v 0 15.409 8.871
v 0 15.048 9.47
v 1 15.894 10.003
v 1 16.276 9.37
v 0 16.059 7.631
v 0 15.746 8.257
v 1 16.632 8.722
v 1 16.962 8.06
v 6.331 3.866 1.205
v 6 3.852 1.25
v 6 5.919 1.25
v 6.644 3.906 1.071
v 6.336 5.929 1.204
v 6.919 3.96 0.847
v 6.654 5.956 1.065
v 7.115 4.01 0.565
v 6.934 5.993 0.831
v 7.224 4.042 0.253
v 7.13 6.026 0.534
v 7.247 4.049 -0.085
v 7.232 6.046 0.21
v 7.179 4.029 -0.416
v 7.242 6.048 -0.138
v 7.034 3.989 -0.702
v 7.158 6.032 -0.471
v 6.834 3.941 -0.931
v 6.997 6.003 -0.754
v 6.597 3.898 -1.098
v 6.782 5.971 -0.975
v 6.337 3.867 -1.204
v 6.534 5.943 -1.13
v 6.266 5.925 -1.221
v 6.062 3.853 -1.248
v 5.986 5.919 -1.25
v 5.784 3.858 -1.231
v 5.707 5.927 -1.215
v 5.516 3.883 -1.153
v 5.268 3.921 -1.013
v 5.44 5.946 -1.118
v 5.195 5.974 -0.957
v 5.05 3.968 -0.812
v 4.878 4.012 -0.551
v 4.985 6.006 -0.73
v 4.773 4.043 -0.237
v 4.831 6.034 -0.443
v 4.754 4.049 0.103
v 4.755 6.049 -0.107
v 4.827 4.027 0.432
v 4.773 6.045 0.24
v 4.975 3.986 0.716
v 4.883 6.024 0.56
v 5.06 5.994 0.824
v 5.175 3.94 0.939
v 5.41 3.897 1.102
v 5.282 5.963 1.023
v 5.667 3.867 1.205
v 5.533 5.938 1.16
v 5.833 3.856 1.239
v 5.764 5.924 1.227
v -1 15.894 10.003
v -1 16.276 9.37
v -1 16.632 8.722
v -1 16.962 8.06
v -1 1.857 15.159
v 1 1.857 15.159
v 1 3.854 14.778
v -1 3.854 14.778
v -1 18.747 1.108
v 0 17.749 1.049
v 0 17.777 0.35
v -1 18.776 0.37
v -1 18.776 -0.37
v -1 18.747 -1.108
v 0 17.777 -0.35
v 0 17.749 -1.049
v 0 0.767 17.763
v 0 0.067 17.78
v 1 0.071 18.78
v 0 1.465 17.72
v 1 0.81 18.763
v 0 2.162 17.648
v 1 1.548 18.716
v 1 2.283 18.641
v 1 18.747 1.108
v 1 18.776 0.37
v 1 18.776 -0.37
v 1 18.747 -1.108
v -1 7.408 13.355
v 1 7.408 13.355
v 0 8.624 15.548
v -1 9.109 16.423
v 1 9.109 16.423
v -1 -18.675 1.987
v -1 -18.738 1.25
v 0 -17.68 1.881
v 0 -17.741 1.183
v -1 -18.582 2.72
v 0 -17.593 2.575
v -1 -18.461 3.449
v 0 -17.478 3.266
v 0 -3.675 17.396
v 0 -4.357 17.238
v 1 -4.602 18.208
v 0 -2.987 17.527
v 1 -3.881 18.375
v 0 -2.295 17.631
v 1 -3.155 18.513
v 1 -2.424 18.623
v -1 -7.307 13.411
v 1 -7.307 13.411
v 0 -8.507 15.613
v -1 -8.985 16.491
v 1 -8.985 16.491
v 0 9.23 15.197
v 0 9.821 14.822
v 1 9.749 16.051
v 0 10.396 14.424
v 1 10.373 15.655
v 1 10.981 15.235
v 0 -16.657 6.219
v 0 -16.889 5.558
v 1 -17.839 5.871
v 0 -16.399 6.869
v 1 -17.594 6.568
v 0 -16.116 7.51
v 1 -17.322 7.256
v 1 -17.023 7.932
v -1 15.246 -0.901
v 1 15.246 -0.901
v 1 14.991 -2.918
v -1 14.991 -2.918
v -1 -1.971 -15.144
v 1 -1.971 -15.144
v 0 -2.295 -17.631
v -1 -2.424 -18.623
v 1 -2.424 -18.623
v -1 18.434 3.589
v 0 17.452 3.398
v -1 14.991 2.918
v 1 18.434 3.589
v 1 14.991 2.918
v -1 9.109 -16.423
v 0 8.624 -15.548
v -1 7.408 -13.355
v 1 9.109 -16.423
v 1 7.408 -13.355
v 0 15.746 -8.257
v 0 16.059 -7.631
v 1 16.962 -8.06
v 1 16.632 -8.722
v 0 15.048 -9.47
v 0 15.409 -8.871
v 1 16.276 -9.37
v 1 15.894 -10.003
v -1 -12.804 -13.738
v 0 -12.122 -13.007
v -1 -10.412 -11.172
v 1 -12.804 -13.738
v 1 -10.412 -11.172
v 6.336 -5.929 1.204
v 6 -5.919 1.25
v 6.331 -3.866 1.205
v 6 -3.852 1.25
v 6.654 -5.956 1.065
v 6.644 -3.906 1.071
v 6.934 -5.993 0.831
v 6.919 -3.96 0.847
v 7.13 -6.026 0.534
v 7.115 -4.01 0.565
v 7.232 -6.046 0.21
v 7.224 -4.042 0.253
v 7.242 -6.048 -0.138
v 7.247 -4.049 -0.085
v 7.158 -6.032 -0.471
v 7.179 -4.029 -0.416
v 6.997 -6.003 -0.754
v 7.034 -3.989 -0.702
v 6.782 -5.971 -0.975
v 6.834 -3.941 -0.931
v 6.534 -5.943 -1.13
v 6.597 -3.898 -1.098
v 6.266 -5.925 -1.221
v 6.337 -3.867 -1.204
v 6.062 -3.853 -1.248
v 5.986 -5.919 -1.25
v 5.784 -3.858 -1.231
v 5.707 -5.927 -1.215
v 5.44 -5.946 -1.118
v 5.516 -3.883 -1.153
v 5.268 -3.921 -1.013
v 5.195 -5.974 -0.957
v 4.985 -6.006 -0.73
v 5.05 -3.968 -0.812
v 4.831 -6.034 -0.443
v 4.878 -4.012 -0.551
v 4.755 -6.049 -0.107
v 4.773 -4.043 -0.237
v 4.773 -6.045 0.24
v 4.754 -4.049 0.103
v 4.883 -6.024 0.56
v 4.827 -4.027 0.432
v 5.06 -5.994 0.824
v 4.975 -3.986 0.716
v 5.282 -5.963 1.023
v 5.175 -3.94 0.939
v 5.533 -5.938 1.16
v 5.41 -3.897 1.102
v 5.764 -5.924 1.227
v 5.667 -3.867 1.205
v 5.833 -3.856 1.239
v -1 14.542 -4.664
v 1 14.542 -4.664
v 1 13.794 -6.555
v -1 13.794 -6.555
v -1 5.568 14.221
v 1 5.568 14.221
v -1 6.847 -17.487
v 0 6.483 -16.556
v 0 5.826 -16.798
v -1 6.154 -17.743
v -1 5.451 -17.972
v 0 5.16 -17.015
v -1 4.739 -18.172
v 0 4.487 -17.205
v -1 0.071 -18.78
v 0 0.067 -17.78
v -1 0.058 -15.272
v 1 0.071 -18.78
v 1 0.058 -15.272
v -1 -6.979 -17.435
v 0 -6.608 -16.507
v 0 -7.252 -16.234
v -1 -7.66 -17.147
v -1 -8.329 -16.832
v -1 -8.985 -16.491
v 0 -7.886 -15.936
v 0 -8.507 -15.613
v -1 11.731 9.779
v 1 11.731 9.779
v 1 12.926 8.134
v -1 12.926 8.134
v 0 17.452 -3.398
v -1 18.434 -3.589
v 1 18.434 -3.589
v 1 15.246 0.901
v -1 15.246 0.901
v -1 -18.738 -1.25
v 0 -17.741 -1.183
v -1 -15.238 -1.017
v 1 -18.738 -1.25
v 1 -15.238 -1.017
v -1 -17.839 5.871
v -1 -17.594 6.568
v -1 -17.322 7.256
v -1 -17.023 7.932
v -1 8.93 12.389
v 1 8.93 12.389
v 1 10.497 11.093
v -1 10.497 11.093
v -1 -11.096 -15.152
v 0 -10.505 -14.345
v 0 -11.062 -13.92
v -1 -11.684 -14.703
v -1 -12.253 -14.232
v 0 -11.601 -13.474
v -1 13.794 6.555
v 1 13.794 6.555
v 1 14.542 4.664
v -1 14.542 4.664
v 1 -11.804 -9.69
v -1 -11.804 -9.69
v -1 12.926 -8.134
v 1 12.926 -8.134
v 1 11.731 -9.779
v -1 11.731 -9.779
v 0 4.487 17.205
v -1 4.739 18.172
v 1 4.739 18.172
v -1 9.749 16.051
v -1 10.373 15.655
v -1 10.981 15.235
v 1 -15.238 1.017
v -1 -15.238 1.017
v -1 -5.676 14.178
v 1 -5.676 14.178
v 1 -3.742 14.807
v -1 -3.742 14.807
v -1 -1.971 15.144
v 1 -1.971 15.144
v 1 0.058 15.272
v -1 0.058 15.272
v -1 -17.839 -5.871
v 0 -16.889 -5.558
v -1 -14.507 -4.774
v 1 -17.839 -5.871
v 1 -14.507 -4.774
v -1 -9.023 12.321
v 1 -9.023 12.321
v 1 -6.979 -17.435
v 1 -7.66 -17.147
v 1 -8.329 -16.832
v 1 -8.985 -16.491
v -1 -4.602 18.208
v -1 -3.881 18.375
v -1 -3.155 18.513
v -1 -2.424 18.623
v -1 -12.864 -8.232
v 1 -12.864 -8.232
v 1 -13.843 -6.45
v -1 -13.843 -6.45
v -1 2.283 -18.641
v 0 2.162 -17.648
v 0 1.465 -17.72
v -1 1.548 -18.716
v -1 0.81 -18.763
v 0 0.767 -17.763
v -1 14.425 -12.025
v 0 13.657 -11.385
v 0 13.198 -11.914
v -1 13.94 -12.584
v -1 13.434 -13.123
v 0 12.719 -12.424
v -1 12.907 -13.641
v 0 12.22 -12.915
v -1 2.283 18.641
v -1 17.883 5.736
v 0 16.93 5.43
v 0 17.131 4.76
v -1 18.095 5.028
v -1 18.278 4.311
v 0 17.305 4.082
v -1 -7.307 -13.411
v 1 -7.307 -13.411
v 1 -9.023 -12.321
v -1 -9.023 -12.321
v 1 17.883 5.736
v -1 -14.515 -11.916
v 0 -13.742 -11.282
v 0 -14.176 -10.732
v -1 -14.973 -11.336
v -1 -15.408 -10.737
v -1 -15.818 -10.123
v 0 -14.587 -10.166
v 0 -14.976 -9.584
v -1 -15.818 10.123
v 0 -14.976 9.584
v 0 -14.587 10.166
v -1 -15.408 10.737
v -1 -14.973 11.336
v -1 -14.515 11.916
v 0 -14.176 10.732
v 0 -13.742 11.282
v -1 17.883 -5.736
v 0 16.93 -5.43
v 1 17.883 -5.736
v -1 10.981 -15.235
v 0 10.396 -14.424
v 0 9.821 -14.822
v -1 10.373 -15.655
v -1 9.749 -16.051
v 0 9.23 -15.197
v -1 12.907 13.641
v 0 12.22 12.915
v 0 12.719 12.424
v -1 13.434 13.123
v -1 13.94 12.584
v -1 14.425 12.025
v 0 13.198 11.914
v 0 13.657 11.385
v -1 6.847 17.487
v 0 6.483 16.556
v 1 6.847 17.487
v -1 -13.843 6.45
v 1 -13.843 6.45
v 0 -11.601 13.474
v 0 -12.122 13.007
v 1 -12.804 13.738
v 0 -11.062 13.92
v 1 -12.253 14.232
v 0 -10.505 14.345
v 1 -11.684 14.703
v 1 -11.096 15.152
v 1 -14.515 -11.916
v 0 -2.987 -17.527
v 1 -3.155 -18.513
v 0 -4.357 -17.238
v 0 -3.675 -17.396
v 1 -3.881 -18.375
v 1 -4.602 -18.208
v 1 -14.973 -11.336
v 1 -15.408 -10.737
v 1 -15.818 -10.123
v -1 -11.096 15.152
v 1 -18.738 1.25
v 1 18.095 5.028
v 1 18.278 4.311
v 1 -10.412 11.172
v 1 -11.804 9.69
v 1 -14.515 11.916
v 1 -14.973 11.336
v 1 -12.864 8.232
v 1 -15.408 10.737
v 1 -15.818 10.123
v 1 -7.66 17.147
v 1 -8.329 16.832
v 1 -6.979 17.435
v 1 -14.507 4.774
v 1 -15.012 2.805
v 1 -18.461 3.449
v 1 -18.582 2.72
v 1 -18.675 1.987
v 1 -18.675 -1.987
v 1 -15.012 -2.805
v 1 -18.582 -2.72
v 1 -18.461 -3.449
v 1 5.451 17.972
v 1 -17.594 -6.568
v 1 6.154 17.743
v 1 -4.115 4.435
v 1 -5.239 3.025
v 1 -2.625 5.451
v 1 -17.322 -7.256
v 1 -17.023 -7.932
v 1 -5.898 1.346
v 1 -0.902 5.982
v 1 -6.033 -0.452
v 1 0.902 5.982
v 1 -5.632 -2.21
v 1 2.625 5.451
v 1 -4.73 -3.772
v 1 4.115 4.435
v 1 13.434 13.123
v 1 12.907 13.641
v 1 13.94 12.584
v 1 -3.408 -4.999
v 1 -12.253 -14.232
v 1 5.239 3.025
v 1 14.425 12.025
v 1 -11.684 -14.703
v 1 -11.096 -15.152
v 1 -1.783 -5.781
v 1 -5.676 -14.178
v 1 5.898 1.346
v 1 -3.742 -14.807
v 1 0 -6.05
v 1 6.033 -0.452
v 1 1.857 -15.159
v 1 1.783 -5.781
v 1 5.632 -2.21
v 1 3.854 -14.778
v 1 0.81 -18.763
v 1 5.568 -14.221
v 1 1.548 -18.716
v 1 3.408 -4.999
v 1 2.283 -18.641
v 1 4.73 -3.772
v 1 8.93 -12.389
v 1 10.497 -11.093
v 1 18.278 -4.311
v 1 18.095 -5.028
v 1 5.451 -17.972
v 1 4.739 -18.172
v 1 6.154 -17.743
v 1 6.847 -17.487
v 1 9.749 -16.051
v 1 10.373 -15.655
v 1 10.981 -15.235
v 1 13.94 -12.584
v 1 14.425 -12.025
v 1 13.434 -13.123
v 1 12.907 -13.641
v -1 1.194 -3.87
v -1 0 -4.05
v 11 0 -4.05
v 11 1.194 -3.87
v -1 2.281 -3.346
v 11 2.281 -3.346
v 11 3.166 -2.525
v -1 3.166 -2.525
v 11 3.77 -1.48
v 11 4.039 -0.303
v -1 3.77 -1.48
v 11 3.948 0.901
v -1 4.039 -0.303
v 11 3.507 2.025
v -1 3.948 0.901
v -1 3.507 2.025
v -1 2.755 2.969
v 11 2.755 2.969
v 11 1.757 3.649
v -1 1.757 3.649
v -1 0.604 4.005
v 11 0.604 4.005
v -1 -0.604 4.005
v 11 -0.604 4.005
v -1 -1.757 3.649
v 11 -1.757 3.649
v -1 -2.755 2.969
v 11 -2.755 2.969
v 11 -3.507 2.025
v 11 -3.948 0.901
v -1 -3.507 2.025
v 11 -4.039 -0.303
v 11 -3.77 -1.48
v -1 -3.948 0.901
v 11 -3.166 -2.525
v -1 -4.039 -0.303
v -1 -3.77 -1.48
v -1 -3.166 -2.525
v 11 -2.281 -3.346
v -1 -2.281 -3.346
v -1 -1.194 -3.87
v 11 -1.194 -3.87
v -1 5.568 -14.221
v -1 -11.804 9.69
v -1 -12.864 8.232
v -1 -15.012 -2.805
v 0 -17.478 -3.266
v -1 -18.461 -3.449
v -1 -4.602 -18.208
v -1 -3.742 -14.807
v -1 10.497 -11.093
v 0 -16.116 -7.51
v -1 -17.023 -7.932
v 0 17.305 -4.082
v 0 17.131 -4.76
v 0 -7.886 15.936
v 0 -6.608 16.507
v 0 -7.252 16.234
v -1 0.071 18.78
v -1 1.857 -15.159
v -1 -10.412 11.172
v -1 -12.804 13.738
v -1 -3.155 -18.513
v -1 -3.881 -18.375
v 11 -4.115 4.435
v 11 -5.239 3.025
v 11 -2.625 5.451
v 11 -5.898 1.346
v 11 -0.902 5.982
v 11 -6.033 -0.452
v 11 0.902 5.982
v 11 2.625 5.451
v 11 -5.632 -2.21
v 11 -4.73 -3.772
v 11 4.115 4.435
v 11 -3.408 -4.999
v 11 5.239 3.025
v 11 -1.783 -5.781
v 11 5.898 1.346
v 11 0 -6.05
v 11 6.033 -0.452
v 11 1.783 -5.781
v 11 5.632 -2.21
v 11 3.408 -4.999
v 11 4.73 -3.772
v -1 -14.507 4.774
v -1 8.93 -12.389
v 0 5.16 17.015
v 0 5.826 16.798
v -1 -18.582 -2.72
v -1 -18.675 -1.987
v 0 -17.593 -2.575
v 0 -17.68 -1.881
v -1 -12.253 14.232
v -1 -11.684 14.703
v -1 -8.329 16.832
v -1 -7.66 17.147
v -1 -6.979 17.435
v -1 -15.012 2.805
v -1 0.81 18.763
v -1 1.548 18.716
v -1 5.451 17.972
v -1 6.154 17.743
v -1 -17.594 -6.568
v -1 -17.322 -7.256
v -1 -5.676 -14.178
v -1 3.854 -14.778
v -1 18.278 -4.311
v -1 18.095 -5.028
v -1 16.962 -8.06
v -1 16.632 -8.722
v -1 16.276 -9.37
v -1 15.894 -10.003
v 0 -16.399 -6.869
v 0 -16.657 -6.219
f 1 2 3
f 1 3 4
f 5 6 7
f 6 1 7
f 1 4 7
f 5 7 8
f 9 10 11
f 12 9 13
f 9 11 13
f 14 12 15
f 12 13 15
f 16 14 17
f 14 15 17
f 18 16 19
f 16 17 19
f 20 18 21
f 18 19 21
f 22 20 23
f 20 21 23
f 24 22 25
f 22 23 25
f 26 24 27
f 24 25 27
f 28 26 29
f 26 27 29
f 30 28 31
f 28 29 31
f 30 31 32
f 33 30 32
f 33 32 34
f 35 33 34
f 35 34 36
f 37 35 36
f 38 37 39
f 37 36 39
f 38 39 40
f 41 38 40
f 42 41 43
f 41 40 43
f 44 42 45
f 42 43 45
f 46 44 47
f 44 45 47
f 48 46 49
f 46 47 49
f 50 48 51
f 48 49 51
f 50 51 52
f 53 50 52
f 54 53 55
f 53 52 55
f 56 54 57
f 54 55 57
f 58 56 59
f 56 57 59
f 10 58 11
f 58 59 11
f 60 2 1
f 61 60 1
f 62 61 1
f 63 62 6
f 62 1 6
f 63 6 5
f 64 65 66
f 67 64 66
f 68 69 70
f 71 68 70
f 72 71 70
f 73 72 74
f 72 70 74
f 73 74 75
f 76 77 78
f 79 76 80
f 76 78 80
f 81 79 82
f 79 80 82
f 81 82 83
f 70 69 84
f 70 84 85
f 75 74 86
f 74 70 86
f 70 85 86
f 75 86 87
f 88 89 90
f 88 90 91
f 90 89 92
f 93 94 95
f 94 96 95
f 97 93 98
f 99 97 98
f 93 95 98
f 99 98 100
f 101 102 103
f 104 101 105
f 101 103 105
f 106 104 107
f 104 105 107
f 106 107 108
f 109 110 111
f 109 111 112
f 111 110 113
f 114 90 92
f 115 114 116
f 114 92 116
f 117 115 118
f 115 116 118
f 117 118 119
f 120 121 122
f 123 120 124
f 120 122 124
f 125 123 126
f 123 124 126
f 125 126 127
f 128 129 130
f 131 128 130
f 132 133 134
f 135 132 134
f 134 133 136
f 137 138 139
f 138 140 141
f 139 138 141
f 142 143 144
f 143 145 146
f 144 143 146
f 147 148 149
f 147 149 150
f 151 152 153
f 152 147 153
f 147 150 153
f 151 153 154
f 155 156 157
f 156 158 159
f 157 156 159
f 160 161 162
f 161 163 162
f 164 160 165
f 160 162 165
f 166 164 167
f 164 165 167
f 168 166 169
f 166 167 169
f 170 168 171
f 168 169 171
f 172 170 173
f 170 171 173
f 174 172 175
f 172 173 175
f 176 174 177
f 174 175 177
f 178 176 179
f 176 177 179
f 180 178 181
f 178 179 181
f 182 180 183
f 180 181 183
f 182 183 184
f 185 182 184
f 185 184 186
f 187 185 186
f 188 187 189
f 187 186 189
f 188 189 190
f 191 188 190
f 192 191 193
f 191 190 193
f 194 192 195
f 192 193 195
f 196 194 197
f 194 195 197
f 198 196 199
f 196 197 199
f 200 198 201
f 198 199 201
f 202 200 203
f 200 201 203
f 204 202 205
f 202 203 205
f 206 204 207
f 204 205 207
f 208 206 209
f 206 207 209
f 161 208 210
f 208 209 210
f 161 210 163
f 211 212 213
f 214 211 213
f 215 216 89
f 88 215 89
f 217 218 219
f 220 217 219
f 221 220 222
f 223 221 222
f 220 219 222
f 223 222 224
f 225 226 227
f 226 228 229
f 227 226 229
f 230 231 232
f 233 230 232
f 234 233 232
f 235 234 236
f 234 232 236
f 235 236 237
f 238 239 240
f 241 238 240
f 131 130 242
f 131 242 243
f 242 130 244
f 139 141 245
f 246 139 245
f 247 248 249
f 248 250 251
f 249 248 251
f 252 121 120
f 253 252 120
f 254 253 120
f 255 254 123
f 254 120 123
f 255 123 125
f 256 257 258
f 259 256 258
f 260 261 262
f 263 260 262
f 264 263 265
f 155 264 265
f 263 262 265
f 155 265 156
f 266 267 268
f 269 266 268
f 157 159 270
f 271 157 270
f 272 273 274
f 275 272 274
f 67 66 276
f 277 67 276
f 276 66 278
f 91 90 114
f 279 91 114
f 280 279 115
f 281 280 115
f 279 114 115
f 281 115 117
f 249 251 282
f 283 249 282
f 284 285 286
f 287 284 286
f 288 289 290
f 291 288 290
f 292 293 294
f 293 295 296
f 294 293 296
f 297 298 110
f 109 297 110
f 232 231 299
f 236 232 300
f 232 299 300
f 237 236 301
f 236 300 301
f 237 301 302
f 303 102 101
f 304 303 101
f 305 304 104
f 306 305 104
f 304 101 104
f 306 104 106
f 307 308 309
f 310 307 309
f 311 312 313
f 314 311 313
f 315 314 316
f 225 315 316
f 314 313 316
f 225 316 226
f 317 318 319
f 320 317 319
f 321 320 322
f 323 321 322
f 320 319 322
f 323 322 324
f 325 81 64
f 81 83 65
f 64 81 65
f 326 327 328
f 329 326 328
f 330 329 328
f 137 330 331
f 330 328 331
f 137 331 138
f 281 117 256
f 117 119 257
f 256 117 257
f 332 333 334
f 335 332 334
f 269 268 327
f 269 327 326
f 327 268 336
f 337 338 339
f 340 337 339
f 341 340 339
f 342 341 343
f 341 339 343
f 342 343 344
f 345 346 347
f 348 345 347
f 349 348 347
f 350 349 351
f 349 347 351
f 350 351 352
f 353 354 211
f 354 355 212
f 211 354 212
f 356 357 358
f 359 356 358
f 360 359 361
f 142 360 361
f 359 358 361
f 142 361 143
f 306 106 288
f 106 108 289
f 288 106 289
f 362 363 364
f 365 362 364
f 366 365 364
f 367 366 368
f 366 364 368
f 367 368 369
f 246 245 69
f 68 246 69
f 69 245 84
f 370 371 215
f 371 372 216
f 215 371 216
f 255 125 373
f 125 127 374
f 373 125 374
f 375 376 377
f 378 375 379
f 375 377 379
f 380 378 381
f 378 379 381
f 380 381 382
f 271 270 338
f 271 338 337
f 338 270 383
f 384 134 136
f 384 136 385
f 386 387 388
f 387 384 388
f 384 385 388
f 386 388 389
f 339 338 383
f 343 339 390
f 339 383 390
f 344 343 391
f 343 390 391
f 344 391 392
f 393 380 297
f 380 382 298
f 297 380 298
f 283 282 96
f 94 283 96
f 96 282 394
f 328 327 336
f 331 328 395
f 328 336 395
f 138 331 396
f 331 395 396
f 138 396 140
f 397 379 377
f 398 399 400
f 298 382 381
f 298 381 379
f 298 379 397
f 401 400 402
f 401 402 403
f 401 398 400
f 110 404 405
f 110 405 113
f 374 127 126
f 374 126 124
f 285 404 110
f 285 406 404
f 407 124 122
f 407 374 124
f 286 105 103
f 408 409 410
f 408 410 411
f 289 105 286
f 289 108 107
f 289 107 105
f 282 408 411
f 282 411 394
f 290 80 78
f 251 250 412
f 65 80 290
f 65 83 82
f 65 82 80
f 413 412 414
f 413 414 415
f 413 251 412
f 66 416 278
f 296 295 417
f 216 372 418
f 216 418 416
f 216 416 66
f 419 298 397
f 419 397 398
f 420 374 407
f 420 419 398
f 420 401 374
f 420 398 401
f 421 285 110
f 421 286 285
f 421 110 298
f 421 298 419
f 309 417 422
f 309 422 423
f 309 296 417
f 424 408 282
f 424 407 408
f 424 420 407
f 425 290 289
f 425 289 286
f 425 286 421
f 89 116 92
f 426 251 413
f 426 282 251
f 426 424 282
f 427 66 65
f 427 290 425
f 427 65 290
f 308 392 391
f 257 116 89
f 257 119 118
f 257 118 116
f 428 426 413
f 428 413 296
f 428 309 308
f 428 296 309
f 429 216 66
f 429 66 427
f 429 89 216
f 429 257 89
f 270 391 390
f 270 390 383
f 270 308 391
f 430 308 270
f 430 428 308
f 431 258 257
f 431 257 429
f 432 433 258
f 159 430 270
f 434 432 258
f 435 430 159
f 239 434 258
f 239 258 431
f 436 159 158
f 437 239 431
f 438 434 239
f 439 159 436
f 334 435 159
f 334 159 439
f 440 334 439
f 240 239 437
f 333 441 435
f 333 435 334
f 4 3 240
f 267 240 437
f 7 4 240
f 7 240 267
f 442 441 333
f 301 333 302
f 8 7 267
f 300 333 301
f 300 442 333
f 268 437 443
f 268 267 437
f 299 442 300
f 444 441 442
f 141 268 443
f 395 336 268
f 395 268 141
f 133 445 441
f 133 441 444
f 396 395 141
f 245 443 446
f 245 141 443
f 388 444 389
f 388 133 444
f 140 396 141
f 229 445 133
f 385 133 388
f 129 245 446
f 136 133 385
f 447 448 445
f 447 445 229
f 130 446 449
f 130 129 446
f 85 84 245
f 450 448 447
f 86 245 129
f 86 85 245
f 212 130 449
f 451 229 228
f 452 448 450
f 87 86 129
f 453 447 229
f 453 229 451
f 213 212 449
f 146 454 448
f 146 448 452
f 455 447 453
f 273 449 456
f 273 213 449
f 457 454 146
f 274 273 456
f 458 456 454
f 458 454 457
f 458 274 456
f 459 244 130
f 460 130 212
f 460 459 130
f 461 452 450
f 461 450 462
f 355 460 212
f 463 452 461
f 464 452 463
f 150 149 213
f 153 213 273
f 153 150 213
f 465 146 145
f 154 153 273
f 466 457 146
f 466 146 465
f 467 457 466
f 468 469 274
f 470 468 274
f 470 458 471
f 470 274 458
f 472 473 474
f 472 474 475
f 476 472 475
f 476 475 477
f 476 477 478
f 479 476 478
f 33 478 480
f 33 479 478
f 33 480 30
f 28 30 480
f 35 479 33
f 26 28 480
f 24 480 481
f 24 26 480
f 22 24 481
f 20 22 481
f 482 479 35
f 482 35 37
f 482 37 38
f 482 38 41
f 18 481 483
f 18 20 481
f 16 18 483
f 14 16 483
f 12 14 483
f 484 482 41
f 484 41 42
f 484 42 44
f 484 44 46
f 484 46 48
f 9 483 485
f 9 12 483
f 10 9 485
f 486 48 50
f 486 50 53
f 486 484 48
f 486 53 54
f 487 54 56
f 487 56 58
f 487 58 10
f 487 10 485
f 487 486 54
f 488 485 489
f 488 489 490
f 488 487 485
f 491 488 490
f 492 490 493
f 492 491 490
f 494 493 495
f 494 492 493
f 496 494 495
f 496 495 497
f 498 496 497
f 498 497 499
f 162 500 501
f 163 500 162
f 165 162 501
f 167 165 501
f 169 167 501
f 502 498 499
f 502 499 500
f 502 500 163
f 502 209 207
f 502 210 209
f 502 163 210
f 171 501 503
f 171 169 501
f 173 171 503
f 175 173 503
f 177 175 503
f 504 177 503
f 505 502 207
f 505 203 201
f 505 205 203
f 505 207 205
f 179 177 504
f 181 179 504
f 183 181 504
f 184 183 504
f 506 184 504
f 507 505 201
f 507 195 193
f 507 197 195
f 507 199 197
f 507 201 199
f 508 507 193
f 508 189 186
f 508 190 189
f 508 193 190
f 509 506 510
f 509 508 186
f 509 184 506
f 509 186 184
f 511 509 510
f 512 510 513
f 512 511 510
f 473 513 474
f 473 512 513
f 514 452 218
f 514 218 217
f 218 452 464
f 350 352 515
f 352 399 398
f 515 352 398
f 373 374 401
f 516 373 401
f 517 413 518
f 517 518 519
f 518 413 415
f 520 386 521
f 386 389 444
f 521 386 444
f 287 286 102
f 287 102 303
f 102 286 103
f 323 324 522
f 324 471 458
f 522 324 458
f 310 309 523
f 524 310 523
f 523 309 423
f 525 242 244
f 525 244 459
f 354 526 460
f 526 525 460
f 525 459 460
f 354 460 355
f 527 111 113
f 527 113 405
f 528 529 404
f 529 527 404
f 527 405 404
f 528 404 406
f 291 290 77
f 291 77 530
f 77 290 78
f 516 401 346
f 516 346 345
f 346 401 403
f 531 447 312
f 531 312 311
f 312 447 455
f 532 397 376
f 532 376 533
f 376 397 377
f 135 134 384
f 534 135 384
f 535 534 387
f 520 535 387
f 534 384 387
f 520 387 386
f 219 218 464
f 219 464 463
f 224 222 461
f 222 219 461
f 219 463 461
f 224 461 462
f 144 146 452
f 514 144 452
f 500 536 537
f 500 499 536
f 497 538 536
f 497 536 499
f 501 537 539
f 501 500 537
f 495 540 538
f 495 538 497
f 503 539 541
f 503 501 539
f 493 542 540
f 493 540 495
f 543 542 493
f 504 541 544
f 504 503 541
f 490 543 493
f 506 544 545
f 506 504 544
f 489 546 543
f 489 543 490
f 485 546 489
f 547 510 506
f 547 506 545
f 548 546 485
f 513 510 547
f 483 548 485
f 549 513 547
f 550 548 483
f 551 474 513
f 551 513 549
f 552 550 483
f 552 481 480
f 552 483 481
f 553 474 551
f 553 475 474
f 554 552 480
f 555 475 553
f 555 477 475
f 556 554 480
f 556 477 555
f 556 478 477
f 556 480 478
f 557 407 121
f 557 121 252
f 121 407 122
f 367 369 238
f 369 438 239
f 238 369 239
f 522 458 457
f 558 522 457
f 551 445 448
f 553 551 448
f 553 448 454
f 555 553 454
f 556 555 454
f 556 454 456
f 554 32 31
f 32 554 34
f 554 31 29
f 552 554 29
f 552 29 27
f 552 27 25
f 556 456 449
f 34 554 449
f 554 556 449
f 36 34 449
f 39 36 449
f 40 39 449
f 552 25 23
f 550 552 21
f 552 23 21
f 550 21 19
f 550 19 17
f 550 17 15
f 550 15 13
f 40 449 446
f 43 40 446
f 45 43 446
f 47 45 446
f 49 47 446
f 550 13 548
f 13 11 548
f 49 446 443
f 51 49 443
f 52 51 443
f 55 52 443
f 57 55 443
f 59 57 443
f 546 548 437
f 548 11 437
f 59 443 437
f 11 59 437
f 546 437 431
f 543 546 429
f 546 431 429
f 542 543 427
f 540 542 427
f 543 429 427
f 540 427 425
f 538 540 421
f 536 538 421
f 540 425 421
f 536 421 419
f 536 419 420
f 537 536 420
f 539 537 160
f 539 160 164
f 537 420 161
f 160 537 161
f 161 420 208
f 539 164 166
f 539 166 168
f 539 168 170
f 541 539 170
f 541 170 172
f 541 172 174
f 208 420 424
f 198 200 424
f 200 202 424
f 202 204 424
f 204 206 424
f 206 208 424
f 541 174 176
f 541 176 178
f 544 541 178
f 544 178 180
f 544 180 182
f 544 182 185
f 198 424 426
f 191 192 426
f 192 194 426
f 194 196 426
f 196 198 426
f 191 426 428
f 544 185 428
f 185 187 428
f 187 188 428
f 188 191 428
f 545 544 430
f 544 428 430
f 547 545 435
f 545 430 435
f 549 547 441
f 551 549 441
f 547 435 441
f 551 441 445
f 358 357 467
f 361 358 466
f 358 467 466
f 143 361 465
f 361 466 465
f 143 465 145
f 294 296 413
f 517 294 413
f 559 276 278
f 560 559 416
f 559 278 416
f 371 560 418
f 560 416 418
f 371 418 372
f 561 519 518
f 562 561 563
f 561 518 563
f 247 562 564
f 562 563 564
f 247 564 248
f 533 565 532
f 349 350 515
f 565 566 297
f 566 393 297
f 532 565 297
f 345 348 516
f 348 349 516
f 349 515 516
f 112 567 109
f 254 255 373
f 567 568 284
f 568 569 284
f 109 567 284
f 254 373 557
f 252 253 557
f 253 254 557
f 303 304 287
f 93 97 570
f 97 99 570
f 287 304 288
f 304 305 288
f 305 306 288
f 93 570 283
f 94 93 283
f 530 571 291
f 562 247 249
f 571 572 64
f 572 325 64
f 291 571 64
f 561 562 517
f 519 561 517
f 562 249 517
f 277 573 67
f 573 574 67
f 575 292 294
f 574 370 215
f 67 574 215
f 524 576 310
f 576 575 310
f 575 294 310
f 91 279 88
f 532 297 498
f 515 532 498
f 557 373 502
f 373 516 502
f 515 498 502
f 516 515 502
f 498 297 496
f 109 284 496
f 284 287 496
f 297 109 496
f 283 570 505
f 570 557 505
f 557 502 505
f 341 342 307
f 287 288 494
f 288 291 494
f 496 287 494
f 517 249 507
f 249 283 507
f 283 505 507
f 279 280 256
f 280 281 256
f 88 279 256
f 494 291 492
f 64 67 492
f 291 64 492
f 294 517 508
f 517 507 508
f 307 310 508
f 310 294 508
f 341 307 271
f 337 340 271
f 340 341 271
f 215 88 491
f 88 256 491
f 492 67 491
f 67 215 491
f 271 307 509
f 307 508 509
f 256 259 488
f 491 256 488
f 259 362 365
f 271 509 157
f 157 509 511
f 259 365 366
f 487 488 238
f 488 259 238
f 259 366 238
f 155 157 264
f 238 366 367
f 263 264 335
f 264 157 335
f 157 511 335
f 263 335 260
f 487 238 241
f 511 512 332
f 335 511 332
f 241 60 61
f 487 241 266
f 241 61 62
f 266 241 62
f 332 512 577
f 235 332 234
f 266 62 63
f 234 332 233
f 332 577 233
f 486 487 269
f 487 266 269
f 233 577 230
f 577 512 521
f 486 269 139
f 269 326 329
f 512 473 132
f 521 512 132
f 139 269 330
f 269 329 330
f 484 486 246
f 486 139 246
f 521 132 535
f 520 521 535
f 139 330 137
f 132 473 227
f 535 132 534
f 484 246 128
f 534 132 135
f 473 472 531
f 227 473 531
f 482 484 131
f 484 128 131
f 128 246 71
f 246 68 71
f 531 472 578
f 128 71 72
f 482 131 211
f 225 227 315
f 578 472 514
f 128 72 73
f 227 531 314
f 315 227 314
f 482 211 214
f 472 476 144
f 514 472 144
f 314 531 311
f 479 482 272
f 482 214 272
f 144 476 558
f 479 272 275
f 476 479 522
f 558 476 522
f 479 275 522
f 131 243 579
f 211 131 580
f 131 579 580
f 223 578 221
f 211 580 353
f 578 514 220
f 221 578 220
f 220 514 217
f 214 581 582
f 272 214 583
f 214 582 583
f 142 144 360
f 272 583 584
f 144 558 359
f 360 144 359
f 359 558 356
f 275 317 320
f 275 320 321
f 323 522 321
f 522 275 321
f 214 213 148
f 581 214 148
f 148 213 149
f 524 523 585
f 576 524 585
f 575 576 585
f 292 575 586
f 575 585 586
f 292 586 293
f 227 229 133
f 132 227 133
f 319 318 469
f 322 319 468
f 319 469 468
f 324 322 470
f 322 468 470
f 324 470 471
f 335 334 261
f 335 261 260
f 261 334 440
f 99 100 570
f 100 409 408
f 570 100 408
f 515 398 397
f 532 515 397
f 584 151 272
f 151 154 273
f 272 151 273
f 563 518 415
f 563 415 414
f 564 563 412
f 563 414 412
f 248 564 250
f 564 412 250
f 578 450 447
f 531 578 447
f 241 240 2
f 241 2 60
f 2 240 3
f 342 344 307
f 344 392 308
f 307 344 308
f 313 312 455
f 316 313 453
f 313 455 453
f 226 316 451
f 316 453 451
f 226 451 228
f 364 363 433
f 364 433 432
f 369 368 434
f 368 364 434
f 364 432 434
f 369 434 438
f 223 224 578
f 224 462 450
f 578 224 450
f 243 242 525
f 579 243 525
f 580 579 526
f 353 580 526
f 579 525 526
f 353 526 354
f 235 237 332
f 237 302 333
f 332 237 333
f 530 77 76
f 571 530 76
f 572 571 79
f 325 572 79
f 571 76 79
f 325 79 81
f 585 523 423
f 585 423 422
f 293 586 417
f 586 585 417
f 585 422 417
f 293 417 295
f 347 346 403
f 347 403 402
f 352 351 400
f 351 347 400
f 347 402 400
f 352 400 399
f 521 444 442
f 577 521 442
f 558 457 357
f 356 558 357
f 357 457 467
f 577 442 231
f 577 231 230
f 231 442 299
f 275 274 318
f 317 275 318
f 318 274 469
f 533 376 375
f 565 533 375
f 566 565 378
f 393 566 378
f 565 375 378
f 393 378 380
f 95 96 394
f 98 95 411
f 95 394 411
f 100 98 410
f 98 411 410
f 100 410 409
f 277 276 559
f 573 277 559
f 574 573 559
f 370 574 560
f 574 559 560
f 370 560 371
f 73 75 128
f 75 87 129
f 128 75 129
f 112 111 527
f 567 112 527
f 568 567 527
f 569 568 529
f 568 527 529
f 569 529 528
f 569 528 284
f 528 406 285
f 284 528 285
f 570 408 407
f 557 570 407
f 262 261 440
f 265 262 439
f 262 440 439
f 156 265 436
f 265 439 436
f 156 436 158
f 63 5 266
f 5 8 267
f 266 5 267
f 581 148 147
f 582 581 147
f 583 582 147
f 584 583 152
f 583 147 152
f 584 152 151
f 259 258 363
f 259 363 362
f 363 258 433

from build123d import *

# Parameters (mm, degrees)
SKETCH2_R           = 18.78
SKETCH2_R_2         = 4.05
BOSS_EXTRUDE1_DEPTH = 1
SKETCH9_R           = 6.05
SKETCH9_R_2         = 4.05
BOSS_EXTRUDE2_DEPTH = 10
SKETCH10_R          = 1.25
CUT_EXTRUDE1_DEPTH  = 10
CUT_EXTRUDE3_DEPTH  = 10
CIRPATTERN1_COUNT   = 25


with BuildPart() as part:
    # Sketch2 → Boss-Extrude1 (new, symmetric)
    with BuildSketch(Plane(origin=(0, 0, 0), x_dir=(0, 0, -1), z_dir=(1, 0, 0))):
        Circle(SKETCH2_R)
        Circle(SKETCH2_R_2, mode=Mode.SUBTRACT)
    extrude(amount=BOSS_EXTRUDE1_DEPTH, both=True)

    # Sketch9 → Boss-Extrude2 (add)
    with BuildSketch(Plane(origin=(1, 0, 0), x_dir=(0, 0, -1), z_dir=(1, 0, 0))):
        Circle(SKETCH9_R)
        Circle(SKETCH9_R_2, mode=Mode.SUBTRACT)
    extrude(amount=BOSS_EXTRUDE2_DEPTH)

    # Sketch5 → Cut-Revolve1 (revolve, cut)
    with BuildSketch(Plane(origin=(0, 0, 0), x_dir=(1, 0, 0), z_dir=(0, 1, 0)), mode=Mode.PRIVATE) as cut_revolve1_sk:
        Polygon((-1, -18.78), (0, -17.78), (1, -18.78), align=None)
    revolve(cut_revolve1_sk.sketch.rotate(Axis((11, 0, 0), (-1, 0, 0)), 180), axis=Axis((11, 0, 0), (-1, 0, 0)), mode=Mode.SUBTRACT)

    # Sketch10 → Cut-Extrude1 (cut, symmetric)
    with BuildSketch(Plane(origin=(0, 0, 0), x_dir=(1, 0, 0), z_dir=(0, 1, 0))):
        with Locations(Location((6, 0, 0), (0, 0, 270))):
            Circle(SKETCH10_R)
    extrude(amount=CUT_EXTRUDE1_DEPTH, both=True, mode=Mode.SUBTRACT)

    # Sketch12 → Cut-Extrude3 (cut, symmetric)
    with BuildSketch(Plane(origin=(1, 0, 0), x_dir=(0, 0, -1), z_dir=(1, 0, 0))):
        with BuildLine():
            ThreePointArc((-1.25, -18.738353716), (0, -18.78), (1.25, -18.738353716))
            Line((1.25, -18.738353716), (1.016521645, -15.238353716))
            Line((1.016521645, -15.238353716), (-1.016521645, -15.238353716))
            Line((-1.016521645, -15.238353716), (-1.25, -18.738353716))
        make_face()
    cut_extrude3 = extrude(amount=CUT_EXTRUDE3_DEPTH, both=True, mode=Mode.SUBTRACT)

    # CirPattern1: Cut-Extrude3 ×25 about axis
    cirpattern1_axis = Axis((0, 0, 0), (1, 0, 0))
    for i in range(1, CIRPATTERN1_COUNT):
        add(cut_extrude3.rotate(cirpattern1_axis, i * 360 / CIRPATTERN1_COUNT), mode=Mode.SUBTRACT)


solid = part.part
